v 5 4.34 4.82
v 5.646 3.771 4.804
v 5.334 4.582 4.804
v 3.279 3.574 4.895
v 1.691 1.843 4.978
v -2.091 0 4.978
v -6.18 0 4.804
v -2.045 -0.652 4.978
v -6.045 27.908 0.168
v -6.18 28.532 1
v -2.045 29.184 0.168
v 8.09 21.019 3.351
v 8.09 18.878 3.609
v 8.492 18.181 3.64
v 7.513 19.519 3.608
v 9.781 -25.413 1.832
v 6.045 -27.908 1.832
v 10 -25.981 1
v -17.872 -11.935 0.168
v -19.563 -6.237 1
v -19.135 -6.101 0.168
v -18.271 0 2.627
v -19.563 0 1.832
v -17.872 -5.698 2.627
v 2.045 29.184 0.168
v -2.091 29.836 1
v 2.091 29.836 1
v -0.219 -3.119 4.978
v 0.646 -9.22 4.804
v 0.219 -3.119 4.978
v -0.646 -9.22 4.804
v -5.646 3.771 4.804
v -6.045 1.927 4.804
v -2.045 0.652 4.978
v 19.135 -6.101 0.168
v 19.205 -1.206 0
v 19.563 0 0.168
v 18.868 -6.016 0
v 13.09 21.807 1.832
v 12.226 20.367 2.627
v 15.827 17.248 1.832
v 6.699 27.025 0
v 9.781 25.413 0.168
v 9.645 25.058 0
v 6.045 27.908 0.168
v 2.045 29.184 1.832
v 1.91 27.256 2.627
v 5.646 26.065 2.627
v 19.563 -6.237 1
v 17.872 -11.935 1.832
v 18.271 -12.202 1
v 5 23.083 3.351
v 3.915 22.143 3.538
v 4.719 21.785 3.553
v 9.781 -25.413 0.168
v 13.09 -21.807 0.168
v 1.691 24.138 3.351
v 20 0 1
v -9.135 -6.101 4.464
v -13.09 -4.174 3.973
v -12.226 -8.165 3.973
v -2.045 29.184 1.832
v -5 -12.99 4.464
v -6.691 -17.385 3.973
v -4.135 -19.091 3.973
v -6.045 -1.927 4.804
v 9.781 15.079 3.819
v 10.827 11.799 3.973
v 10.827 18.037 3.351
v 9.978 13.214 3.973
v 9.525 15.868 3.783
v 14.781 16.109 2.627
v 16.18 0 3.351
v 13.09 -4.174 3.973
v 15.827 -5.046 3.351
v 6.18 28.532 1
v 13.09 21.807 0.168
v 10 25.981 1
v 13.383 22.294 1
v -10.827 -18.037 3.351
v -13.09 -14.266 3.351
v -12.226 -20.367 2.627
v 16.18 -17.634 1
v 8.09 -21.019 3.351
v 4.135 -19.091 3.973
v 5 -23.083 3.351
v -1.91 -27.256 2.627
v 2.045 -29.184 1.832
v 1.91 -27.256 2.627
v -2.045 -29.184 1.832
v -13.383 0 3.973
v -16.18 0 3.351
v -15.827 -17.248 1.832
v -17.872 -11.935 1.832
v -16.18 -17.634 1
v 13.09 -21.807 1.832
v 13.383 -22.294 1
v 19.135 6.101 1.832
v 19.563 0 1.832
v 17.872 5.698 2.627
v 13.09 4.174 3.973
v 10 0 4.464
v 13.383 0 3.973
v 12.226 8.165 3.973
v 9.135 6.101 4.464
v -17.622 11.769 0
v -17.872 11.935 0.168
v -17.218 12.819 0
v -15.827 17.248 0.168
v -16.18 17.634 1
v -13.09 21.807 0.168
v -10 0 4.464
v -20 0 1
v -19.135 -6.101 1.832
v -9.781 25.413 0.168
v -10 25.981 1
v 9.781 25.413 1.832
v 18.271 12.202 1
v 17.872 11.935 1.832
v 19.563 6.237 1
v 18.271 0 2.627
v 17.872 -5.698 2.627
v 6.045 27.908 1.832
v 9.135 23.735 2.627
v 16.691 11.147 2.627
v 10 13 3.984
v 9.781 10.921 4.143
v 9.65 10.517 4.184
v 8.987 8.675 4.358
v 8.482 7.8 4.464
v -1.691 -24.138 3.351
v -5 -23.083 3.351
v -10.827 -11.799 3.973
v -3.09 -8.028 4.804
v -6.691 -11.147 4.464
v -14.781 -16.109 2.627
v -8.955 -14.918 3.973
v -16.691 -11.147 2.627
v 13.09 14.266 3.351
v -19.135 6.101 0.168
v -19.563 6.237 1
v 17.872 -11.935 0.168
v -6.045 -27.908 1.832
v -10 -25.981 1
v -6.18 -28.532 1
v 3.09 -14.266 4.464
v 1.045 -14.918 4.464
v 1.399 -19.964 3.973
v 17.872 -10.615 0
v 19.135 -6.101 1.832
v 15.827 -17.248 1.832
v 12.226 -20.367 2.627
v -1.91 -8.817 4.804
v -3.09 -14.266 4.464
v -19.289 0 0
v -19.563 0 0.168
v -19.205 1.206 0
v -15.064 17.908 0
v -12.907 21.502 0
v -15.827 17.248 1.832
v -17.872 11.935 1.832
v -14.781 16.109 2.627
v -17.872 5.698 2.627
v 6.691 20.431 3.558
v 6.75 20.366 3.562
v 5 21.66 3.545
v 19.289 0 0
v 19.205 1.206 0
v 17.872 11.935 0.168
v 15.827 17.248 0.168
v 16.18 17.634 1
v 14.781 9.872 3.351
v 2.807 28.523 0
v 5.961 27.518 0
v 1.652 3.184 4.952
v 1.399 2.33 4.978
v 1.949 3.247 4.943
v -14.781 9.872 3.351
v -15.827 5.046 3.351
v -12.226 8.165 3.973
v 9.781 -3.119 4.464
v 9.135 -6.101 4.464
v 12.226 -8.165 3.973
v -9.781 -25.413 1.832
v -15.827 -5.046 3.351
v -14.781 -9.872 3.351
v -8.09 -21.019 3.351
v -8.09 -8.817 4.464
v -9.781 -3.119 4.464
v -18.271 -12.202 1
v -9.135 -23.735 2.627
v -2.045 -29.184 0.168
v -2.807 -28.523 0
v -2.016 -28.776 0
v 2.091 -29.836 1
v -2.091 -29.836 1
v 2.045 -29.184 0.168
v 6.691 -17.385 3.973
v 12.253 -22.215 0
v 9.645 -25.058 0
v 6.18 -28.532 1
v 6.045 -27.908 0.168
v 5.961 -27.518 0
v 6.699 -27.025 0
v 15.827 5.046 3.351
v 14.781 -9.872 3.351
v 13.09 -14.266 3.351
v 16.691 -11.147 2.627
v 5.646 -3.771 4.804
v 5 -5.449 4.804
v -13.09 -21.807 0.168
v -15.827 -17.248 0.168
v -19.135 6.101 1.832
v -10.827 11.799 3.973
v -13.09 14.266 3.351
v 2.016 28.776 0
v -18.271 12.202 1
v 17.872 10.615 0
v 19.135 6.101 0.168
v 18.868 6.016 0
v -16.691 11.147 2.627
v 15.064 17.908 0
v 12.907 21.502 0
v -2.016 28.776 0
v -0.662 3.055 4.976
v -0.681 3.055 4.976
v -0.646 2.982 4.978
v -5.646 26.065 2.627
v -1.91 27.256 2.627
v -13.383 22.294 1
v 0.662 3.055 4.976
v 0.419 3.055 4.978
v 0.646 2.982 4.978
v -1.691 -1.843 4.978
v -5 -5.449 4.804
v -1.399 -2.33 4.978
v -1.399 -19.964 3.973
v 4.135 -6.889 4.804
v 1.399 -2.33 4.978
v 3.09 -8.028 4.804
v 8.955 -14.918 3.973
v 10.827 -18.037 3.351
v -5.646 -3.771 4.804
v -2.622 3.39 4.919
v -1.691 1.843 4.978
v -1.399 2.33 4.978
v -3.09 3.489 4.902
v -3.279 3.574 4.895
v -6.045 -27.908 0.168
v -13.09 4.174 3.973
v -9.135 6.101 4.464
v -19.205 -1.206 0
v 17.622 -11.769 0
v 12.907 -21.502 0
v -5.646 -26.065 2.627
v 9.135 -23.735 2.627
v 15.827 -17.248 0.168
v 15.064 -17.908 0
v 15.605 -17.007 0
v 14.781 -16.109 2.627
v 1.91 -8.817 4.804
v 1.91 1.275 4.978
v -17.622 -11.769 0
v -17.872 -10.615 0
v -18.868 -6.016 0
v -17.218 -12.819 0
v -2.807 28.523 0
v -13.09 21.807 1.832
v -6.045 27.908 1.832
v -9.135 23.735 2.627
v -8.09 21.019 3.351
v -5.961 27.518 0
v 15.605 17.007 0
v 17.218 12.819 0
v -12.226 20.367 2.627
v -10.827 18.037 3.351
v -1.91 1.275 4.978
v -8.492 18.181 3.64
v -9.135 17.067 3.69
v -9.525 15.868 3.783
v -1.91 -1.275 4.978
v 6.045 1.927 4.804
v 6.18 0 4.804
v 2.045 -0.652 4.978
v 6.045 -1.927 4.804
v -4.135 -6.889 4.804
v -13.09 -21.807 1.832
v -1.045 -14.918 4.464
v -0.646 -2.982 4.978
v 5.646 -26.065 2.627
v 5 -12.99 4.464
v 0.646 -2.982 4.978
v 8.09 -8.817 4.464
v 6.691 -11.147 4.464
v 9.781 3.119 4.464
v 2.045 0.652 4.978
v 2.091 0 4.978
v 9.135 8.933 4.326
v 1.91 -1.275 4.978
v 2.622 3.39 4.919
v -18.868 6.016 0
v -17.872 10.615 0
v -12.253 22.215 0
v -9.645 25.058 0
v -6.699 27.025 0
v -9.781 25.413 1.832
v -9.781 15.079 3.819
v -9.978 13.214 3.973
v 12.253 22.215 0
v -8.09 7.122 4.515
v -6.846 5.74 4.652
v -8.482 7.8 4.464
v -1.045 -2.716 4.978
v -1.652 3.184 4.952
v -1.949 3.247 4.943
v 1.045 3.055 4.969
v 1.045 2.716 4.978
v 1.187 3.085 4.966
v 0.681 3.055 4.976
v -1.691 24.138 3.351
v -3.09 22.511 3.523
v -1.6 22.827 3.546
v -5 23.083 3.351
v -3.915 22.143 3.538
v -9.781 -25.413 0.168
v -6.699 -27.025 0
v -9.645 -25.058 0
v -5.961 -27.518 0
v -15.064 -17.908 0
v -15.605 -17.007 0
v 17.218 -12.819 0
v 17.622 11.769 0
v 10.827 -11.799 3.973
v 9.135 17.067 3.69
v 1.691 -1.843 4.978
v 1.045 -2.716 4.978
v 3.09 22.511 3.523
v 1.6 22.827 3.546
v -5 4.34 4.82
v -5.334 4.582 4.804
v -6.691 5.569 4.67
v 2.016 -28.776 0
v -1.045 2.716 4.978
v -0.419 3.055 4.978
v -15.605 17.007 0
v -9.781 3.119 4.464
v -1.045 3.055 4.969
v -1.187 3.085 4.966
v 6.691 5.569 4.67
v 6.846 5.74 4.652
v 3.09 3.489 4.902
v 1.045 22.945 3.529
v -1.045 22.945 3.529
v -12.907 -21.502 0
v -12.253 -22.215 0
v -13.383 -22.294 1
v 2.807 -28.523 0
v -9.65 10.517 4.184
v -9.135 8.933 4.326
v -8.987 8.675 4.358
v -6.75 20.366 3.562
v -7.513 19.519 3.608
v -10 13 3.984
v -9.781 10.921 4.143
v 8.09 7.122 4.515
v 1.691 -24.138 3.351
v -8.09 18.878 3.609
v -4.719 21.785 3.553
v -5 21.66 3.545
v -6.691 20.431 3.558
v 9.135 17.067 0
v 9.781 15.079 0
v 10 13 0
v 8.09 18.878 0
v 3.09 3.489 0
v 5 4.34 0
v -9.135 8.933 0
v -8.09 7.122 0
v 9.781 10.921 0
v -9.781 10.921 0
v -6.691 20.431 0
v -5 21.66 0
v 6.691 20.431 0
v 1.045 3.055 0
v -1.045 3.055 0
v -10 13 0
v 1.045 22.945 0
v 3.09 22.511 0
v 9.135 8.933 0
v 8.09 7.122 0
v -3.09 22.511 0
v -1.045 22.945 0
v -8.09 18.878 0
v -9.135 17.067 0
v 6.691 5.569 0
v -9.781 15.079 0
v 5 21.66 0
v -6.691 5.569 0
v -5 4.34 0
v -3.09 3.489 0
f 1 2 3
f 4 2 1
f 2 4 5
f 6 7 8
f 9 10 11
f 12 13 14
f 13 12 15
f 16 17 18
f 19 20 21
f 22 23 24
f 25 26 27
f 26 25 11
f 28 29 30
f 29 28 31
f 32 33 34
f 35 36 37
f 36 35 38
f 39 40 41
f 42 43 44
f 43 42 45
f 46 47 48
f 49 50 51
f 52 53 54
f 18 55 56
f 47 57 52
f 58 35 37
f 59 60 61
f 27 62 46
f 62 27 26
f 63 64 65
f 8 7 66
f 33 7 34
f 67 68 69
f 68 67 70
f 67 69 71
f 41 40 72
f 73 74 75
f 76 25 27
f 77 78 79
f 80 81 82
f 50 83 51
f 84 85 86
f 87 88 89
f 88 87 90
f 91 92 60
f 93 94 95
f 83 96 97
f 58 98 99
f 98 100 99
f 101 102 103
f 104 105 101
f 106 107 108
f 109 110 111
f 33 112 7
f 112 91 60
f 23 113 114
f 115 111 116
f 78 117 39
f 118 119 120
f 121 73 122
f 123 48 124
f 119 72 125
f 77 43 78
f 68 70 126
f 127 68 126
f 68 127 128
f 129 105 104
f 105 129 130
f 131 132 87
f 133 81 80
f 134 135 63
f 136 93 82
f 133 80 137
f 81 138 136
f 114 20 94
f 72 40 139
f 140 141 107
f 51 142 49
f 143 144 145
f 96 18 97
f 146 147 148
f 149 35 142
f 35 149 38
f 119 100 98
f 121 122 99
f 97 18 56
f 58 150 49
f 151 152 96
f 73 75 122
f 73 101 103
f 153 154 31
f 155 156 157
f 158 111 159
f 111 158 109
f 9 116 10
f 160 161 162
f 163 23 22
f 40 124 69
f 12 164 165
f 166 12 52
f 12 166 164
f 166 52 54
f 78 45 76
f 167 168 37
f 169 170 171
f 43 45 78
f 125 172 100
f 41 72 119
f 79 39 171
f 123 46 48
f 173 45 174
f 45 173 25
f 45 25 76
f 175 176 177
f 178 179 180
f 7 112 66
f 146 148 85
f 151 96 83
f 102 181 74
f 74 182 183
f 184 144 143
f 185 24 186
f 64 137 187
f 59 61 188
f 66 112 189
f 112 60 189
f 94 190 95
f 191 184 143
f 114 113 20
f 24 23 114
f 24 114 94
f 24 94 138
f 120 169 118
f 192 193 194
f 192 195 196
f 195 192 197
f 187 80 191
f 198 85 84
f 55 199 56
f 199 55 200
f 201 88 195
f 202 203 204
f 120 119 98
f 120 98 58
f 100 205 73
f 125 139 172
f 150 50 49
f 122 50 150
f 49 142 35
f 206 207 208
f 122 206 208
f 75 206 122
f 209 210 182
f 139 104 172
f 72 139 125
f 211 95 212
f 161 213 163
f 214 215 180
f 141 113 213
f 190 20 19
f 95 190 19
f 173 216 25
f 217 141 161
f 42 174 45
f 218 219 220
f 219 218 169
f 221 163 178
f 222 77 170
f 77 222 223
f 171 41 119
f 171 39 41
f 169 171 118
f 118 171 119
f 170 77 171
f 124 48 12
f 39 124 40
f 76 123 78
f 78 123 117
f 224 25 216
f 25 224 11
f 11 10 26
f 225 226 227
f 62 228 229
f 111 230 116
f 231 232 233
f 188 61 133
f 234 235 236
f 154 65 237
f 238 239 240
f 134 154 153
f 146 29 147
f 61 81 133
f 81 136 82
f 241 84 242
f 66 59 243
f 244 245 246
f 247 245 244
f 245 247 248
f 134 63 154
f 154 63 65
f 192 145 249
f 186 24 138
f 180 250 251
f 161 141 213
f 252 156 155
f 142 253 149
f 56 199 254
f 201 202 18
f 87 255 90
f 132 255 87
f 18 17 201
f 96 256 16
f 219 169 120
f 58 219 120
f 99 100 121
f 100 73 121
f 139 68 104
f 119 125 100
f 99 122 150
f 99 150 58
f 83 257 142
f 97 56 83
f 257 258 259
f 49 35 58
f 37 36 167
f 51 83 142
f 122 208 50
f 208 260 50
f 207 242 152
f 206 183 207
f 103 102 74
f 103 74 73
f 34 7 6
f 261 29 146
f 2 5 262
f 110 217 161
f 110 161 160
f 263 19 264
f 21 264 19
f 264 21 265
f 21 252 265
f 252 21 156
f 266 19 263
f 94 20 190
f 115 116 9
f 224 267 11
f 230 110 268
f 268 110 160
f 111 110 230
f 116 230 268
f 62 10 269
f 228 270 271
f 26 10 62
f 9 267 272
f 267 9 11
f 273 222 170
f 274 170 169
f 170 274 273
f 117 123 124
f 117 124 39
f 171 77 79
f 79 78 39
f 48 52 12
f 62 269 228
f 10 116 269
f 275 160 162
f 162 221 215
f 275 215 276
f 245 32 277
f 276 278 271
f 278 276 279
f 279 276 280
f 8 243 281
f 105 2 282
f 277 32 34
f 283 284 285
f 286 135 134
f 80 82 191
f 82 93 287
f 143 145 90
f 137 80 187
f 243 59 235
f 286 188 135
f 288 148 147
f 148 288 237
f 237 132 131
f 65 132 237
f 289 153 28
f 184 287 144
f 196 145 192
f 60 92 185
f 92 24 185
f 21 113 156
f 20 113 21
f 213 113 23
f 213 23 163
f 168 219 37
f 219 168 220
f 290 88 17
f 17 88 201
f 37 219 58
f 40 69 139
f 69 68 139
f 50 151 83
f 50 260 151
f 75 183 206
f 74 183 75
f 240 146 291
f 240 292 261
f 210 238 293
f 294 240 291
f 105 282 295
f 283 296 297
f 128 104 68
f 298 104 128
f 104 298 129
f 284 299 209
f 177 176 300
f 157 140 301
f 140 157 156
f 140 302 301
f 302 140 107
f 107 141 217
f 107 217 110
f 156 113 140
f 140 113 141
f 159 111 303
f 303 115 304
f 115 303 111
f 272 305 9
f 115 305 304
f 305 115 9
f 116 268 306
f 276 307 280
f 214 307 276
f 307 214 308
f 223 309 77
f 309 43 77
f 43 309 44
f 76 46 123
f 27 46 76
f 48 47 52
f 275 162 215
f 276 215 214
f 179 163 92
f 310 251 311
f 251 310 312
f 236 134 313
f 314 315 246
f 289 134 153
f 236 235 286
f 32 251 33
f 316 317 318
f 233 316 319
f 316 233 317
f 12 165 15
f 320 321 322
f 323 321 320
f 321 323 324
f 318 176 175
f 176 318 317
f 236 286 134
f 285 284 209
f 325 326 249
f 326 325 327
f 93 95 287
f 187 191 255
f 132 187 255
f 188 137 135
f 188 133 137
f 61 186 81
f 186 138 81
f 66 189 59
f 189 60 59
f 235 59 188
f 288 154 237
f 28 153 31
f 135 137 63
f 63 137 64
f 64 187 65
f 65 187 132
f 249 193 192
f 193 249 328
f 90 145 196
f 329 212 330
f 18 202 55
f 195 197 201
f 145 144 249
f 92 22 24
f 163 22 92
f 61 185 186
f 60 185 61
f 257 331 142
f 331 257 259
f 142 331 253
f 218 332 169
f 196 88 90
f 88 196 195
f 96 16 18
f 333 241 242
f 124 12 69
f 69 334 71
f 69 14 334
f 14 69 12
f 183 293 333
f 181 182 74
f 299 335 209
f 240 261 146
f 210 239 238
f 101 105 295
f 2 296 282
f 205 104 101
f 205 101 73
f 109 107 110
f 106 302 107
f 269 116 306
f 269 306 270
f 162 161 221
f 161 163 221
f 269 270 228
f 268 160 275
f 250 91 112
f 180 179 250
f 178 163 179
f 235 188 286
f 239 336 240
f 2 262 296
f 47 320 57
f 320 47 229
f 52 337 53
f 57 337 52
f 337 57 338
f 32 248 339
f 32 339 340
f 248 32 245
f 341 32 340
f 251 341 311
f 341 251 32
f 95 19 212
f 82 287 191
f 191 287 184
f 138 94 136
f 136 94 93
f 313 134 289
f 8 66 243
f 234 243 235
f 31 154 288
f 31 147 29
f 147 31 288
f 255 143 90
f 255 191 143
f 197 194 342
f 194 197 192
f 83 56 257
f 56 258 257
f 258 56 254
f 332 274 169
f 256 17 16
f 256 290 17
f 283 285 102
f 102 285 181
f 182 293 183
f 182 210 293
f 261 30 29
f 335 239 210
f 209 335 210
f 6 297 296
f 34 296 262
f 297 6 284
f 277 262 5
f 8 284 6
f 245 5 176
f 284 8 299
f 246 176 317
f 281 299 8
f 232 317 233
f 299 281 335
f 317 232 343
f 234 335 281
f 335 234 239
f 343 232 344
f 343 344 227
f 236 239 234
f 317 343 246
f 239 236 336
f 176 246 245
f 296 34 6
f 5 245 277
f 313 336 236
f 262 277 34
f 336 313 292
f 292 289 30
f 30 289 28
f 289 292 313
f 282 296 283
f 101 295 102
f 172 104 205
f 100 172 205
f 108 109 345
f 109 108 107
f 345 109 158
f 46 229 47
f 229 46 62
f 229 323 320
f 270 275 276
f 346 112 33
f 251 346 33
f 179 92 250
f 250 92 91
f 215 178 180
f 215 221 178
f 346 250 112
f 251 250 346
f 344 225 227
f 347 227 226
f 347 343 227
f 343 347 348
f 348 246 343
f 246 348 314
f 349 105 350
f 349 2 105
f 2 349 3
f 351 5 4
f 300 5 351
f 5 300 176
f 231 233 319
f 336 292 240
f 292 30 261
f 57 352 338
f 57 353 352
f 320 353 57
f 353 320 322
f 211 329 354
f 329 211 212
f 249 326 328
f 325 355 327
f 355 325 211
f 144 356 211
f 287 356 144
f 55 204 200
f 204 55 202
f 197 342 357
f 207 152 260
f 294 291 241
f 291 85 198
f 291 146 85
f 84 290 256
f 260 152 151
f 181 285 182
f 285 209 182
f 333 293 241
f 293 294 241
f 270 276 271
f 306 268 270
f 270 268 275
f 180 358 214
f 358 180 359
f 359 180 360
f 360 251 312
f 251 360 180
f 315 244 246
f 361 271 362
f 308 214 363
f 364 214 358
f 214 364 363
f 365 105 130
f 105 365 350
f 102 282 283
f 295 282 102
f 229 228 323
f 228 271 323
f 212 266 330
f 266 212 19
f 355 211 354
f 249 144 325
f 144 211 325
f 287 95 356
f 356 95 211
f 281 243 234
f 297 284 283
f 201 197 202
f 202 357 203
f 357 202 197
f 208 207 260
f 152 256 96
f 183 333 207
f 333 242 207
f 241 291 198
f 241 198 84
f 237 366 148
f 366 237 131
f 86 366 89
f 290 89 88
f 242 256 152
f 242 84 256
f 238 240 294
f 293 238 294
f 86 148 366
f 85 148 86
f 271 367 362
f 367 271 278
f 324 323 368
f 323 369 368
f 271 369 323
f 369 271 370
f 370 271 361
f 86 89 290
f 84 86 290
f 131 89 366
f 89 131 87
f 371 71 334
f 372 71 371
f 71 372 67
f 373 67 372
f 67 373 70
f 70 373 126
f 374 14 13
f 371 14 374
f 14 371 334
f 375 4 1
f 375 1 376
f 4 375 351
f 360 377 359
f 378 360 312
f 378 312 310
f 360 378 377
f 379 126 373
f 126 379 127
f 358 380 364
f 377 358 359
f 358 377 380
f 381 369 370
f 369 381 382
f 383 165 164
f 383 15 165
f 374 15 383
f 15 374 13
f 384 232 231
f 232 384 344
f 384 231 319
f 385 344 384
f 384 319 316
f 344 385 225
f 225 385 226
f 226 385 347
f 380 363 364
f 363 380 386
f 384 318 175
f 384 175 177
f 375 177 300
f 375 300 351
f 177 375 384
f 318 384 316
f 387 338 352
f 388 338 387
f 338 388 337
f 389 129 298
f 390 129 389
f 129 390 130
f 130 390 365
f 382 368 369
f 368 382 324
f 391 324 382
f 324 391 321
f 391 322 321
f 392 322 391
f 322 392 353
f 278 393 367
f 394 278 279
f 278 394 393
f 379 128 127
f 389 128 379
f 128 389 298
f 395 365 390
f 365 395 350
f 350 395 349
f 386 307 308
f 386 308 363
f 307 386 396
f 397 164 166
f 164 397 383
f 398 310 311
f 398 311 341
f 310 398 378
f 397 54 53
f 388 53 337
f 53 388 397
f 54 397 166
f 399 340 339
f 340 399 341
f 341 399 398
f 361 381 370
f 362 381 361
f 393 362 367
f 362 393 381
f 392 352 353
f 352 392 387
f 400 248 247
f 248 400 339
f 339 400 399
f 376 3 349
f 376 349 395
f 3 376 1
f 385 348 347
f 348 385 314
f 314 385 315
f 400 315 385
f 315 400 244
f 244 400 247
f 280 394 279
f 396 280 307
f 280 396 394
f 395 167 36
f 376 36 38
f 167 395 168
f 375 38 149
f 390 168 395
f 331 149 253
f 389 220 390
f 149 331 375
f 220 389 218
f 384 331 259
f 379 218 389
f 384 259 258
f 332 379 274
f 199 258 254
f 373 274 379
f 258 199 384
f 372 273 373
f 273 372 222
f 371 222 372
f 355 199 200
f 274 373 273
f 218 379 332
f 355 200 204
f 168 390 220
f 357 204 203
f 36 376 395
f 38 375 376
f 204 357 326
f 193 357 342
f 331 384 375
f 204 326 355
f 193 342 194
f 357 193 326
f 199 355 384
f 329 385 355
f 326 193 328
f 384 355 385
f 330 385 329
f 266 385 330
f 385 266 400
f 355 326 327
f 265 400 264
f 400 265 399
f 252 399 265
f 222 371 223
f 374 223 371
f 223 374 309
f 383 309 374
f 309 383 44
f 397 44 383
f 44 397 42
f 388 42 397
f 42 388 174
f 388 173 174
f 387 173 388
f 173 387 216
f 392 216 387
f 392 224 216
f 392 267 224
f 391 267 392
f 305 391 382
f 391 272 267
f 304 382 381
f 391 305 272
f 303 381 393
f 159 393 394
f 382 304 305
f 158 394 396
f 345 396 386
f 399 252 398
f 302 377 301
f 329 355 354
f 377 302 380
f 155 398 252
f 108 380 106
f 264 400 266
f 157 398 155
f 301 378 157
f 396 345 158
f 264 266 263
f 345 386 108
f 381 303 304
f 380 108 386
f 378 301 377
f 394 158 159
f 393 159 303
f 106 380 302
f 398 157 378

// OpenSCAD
difference() {
    // Main oval
    translate([0,0,1])
        scale([1,1.5,.2])
            sphere(r=20);

    // Cut handle
    translate([0,13,0])
        cylinder(r=10, h=40, center=true);

    // Cut off bottom for flat print
    translate([-50,-50,-100])
        cube([100,100,100]);

}
